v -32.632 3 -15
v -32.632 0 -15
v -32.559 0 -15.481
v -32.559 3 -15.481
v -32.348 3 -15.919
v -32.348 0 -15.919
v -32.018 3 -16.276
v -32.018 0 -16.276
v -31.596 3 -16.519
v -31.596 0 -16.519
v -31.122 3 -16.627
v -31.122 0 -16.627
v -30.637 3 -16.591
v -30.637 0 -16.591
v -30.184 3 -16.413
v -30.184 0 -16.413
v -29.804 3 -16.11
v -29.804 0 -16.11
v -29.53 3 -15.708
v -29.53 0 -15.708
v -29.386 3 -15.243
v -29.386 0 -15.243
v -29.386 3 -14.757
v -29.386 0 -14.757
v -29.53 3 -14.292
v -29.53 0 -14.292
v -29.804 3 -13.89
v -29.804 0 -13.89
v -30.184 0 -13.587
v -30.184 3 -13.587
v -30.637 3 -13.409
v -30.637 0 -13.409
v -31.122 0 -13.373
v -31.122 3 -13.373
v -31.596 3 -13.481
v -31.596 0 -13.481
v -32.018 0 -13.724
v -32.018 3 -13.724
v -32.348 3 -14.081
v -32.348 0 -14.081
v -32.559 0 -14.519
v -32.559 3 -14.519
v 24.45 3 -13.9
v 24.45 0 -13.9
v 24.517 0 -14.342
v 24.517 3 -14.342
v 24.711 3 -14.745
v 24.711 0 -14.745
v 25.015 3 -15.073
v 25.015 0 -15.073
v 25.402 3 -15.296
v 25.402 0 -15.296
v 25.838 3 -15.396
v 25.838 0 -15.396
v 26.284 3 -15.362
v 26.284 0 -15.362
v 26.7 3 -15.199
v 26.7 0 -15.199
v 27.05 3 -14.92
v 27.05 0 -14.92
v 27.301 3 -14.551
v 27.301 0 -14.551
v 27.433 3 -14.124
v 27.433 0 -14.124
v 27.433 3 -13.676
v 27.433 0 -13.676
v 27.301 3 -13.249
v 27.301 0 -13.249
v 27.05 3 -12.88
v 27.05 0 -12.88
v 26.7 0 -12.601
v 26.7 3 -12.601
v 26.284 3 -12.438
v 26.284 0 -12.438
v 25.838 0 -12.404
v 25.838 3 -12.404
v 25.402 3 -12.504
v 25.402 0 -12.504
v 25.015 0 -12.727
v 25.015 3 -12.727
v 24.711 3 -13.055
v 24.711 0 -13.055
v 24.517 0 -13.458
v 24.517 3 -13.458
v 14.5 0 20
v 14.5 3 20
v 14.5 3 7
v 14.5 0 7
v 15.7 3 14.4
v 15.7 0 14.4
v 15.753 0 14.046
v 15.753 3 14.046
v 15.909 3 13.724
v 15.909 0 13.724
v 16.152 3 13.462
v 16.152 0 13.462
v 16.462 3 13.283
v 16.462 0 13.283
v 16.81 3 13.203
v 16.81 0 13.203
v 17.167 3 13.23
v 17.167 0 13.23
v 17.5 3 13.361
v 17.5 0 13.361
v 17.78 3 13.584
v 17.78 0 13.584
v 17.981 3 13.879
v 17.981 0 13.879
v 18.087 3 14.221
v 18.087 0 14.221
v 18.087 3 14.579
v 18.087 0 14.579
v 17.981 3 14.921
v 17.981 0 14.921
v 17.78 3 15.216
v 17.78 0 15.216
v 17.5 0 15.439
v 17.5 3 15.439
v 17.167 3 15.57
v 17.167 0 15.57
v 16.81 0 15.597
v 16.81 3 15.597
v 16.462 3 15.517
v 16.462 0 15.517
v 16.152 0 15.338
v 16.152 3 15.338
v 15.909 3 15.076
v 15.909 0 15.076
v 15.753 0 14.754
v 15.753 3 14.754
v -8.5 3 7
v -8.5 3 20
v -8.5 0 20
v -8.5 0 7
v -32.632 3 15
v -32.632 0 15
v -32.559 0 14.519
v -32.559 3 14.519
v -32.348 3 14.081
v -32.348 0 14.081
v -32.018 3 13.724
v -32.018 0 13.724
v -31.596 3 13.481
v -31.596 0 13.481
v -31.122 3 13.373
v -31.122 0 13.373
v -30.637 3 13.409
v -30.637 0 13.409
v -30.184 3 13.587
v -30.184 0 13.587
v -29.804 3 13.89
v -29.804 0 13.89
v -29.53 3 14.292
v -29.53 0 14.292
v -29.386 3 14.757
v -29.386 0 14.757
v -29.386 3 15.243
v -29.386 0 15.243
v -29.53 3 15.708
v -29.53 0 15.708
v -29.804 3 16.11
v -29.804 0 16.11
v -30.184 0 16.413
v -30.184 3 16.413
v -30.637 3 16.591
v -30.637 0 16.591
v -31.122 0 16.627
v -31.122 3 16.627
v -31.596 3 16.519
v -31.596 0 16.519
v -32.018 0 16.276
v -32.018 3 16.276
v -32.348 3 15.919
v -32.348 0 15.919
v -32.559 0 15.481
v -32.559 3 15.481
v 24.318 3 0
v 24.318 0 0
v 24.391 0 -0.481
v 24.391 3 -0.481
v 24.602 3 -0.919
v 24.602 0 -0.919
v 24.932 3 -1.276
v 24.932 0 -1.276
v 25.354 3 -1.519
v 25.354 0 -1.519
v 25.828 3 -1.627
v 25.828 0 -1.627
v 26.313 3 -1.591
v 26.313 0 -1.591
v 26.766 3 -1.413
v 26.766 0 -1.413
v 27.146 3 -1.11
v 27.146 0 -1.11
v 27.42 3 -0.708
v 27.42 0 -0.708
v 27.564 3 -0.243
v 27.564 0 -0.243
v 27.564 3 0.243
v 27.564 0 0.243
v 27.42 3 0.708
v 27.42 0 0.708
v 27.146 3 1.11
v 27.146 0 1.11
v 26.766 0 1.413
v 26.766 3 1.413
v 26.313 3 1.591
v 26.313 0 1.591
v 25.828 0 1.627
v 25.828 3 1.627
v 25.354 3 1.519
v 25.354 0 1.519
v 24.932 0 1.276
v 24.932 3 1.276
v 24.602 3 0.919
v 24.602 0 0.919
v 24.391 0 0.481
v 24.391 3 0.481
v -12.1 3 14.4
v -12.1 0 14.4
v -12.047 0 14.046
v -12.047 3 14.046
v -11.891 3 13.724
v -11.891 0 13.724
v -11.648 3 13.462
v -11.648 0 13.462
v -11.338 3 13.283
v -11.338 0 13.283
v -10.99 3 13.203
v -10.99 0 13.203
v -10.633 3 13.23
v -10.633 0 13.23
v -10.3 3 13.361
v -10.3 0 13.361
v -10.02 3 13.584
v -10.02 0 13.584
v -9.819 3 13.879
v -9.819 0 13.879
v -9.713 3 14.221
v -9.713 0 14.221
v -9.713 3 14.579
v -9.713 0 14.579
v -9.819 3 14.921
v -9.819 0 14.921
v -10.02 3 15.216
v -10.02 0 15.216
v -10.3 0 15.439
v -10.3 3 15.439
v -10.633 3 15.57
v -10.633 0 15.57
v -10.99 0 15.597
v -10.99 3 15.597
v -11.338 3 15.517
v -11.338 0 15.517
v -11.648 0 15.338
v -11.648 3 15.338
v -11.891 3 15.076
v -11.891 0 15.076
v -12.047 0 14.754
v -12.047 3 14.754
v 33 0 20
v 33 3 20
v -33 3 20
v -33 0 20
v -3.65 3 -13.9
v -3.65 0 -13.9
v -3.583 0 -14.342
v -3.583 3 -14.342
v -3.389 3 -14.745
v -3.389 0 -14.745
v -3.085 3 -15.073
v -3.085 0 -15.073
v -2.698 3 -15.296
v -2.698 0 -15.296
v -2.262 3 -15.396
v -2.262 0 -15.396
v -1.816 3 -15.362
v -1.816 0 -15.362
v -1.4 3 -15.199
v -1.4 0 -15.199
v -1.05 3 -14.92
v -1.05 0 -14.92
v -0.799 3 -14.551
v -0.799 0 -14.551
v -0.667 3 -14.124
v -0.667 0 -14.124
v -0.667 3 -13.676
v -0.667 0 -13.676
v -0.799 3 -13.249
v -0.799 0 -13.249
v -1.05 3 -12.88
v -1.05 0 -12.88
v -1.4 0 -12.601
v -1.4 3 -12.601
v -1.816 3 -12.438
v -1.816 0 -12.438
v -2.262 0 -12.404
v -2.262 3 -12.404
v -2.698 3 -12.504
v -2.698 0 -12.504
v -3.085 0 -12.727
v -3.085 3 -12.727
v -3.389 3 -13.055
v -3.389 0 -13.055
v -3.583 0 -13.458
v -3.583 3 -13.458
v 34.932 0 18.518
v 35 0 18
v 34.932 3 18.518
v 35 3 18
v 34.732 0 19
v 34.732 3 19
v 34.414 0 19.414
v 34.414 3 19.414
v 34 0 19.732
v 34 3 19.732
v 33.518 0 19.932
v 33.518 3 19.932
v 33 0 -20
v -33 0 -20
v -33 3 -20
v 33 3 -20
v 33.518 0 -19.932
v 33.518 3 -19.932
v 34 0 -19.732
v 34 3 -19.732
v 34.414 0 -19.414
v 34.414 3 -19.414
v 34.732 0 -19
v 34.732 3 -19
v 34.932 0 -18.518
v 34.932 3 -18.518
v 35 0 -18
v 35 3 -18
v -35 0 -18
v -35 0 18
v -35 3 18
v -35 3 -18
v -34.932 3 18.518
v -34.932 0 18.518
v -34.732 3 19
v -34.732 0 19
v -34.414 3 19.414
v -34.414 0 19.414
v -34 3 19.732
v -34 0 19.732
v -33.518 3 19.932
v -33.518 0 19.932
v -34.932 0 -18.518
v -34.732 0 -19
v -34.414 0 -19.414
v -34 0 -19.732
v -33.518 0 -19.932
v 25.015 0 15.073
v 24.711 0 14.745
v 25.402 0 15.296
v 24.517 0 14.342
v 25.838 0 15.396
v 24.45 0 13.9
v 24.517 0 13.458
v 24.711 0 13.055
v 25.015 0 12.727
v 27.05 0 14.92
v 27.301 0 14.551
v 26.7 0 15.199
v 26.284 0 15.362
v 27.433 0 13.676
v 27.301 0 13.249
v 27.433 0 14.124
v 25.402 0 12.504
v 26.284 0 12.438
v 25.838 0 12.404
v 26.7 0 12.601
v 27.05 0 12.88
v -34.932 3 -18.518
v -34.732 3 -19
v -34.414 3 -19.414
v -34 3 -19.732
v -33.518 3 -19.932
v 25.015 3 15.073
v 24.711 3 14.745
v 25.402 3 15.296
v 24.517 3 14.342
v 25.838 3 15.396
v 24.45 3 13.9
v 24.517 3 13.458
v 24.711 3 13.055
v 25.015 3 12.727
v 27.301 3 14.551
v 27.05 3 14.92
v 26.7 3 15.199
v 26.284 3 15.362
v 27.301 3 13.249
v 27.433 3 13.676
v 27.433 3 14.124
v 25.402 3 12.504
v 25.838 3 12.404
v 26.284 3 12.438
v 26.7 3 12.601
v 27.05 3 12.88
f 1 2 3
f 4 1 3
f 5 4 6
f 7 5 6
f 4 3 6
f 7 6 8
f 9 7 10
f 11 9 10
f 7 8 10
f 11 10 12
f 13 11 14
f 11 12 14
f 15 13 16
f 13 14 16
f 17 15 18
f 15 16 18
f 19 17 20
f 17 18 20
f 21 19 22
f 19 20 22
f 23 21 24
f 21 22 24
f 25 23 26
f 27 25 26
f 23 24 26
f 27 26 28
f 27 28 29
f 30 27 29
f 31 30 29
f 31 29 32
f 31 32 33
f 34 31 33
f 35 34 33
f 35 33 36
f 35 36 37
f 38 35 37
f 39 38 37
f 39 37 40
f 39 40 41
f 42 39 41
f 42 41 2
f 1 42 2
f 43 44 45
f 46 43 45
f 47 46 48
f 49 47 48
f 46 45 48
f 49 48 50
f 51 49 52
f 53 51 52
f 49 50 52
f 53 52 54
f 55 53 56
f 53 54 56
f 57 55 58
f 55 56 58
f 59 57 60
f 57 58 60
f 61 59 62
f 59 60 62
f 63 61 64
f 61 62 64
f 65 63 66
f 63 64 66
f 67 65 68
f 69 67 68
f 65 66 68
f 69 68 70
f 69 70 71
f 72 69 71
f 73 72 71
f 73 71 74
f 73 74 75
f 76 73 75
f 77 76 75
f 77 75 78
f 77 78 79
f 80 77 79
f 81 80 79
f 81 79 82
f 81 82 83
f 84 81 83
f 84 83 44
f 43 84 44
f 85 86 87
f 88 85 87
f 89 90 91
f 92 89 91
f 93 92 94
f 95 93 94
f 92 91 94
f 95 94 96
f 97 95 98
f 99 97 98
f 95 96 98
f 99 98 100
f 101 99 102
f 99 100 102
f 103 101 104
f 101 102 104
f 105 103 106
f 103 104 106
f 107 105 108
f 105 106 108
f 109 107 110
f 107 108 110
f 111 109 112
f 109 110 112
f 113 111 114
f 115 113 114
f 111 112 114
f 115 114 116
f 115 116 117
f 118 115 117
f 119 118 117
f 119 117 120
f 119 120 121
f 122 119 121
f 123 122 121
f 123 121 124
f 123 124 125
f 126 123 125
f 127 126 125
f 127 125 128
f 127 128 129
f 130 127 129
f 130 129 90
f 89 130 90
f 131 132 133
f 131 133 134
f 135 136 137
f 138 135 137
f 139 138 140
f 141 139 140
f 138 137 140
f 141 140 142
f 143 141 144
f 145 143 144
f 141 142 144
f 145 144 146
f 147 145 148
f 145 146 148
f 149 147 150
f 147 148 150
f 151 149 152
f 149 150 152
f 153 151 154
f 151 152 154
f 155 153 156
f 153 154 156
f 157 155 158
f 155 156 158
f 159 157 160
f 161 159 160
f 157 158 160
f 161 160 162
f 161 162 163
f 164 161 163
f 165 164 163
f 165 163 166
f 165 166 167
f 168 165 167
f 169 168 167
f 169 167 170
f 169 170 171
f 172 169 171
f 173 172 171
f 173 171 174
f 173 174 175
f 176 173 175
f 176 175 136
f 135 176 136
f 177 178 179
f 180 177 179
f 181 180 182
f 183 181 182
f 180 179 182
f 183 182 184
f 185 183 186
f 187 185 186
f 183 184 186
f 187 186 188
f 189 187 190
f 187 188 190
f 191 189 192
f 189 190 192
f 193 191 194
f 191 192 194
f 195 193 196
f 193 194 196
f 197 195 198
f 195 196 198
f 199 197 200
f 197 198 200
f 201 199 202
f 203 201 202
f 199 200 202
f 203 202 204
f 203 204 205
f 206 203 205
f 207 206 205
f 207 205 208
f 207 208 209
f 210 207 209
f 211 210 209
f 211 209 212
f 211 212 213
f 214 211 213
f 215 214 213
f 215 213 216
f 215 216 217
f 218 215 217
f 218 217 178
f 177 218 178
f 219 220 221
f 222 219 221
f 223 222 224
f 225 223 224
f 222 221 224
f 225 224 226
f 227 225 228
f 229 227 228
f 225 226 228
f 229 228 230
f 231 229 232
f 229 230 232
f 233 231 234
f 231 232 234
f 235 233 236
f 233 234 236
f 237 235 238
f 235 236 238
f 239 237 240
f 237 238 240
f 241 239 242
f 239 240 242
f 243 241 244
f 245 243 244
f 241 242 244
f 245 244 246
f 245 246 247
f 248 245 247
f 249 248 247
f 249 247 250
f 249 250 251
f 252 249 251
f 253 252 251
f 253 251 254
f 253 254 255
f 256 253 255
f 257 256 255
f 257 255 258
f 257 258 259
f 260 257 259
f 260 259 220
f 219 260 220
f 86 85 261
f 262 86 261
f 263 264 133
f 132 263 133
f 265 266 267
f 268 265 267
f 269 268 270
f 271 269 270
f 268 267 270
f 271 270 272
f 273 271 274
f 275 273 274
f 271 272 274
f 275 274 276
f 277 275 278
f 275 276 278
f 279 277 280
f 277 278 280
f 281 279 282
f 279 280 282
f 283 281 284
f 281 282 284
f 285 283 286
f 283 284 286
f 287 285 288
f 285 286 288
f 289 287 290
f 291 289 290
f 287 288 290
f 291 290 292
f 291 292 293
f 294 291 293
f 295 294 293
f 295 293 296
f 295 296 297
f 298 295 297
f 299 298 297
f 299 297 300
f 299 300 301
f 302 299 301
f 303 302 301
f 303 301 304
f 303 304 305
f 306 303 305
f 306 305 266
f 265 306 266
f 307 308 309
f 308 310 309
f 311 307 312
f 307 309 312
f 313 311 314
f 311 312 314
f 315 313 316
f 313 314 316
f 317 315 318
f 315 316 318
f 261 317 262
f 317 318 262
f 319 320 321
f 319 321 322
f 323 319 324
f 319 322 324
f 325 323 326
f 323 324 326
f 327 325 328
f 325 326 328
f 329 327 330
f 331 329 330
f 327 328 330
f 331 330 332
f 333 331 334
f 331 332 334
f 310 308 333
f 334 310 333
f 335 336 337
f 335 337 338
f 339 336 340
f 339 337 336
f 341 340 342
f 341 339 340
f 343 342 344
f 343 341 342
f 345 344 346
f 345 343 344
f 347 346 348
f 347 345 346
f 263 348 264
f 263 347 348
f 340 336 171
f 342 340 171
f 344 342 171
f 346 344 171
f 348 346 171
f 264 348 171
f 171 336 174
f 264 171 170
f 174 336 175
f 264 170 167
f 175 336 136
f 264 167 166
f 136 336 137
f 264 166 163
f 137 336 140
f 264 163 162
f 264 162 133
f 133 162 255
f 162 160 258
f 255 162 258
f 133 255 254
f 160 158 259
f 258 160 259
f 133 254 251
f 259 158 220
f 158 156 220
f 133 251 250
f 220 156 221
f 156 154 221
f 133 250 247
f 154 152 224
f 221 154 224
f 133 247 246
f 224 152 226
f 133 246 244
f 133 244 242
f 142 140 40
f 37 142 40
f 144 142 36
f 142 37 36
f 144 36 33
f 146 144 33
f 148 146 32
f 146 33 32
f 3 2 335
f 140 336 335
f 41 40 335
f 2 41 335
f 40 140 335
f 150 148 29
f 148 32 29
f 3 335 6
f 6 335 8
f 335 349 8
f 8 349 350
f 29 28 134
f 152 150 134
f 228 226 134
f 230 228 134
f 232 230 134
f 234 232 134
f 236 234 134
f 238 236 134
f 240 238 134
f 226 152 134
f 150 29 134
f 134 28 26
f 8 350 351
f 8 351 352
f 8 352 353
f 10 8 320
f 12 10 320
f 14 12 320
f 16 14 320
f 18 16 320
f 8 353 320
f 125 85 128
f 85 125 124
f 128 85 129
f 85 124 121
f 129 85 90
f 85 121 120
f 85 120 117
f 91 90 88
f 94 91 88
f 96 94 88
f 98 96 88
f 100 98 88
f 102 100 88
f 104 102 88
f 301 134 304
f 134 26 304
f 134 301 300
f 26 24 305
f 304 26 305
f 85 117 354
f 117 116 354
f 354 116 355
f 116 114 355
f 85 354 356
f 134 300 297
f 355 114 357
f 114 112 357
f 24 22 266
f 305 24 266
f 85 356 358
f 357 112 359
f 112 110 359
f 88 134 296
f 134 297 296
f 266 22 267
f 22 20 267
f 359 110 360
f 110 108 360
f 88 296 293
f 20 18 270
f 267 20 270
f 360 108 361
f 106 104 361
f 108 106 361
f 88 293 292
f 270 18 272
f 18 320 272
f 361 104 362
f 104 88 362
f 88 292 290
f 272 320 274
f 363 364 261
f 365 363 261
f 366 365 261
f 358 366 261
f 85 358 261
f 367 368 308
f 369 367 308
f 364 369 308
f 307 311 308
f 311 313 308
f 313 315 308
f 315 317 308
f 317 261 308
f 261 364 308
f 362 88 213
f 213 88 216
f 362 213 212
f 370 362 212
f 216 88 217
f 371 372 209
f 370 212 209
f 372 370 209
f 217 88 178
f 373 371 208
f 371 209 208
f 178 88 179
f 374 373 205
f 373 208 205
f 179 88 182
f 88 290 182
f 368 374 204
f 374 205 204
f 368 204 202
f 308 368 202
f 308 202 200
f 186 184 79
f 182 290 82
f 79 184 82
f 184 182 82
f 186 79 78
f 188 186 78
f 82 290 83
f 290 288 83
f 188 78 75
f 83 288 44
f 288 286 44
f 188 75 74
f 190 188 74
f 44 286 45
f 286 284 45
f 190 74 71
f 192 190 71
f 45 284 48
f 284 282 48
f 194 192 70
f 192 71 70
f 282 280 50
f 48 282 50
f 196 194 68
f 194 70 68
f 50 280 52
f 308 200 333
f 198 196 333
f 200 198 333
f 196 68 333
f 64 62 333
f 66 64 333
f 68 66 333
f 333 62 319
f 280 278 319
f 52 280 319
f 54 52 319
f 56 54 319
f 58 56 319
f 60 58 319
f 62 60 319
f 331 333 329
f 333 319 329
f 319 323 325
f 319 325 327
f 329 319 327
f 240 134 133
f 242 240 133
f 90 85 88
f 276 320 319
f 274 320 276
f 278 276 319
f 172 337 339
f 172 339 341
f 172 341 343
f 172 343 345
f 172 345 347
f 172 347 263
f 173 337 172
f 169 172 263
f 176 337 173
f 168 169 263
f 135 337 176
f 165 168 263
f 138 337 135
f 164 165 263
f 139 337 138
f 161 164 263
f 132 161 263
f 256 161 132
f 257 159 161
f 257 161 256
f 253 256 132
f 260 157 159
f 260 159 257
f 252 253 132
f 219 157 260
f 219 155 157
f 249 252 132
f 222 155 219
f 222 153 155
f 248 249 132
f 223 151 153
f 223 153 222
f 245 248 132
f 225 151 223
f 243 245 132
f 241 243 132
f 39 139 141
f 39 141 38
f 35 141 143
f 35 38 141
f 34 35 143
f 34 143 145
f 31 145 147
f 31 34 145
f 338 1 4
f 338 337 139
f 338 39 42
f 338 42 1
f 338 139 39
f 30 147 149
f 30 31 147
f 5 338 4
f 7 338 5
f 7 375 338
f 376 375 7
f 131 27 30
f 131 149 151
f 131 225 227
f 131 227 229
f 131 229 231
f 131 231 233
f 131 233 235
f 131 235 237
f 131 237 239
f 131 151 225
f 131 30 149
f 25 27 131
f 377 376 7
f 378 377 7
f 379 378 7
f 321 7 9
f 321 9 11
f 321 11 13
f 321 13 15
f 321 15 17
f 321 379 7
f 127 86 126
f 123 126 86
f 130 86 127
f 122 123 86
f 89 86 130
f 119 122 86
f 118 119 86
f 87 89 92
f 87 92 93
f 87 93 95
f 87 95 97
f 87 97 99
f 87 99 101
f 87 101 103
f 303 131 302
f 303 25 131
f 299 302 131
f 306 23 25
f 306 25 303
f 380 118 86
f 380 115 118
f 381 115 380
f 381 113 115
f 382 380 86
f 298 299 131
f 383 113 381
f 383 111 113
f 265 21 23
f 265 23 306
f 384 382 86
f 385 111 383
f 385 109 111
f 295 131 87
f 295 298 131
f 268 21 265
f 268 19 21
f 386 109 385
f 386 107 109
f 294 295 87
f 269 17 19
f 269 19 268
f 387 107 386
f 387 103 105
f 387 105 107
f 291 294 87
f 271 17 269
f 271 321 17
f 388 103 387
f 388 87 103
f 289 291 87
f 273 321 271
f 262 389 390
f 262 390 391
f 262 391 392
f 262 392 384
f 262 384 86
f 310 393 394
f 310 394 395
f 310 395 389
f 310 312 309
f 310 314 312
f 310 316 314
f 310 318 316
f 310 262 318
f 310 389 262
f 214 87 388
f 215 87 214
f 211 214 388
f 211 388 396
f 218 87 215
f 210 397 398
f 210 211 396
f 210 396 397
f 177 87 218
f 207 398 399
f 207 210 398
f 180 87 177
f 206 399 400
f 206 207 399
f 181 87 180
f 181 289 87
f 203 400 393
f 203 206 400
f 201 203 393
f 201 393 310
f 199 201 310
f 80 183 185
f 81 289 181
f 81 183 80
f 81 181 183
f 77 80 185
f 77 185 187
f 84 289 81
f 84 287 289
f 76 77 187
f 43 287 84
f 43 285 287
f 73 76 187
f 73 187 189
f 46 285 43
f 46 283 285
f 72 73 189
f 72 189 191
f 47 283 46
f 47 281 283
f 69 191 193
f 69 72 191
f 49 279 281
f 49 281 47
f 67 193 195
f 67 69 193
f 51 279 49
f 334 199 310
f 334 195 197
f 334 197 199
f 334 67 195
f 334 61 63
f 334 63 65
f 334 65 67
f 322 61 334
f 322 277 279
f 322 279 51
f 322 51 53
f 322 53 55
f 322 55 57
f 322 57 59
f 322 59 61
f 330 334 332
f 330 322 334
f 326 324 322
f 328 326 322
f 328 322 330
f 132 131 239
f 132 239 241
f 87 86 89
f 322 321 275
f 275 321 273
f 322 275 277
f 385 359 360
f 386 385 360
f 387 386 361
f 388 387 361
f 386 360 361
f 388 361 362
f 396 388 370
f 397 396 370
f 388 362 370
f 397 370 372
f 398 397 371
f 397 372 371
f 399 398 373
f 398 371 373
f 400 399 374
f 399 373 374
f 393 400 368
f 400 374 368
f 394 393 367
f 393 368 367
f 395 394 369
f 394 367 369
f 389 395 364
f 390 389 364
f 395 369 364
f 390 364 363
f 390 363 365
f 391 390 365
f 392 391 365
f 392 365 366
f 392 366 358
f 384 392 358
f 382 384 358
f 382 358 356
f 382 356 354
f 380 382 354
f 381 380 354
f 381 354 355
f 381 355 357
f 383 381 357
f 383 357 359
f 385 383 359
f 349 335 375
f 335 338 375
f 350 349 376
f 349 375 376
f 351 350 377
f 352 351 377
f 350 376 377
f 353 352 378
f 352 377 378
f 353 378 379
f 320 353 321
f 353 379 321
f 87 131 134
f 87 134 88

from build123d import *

# Parameters (mm, degrees)
SKETCH1_W             = 70
SKETCH1_H             = 40
BOSS_EXTRUDE1_DEPTH   = 3
F_3_0MM_DOWEL_HOLE1_D = 3
F_4_CLEARANCE_HOLE1_D = 3.2639
M2_CLEARANCE_HOLE1_D  = 2.4
SKETCH8_W             = 23
SKETCH8_H             = 13
CUT_EXTRUDE1_DEPTH    = 10
FILLET1_R             = 2


with BuildPart() as part:
    # Sketch1 → Boss-Extrude1 (new body)
    with BuildSketch(Plane(origin=(0, 0, 0), x_dir=(1, 0, 0), z_dir=(0, 1, 0))):
        Rectangle(SKETCH1_W, SKETCH1_H)
    extrude(amount=BOSS_EXTRUDE1_DEPTH)

    # Ø3.0mm Dowel Hole1 (through all)
    with Locations(Plane(origin=(0, 3, 0), x_dir=(1, 0, 0), z_dir=(0, 1, 0))):
        with Locations((-2.15, 13.9), (25.95, 13.9), (25.95, -13.9)):
            Hole(F_3_0MM_DOWEL_HOLE1_D / 2)

    # #4 Clearance Hole1 (through all)
    with Locations(Plane(origin=(0, 3, 0), x_dir=(1, 0, 0), z_dir=(0, 1, 0))):
        with Locations((-31, 15), (-31, -15), (25.95, 0)):
            Hole(F_4_CLEARANCE_HOLE1_D / 2)

    # M2 Clearance Hole1 (through all)
    with Locations(Plane(origin=(0, 3, 0), x_dir=(1, 0, 0), z_dir=(0, 1, 0))):
        with Locations((-10.9, -14.4), (16.9, -14.4)):
            Hole(M2_CLEARANCE_HOLE1_D / 2)

    # Sketch8 → Cut-Extrude1 (cut)
    with BuildSketch(Plane(origin=(0, 3, 0), x_dir=(1, 0, 0), z_dir=(0, 1, 0))):
        with Locations((3, -13.5)):
            Rectangle(SKETCH8_W, SKETCH8_H)
    extrude(amount=-CUT_EXTRUDE1_DEPTH, mode=Mode.SUBTRACT)

    # Fillet1
    fillet1_edges = [part.edges().sort_by_distance(p)[0] for p in [
        (35, 1.5, 20),
        (-35, 1.5, 20),
        (-35, 1.5, -20),
        (35, 1.5, -20),
    ]]
    fillet(fillet1_edges, radius=FILLET1_R)


solid = part.part
